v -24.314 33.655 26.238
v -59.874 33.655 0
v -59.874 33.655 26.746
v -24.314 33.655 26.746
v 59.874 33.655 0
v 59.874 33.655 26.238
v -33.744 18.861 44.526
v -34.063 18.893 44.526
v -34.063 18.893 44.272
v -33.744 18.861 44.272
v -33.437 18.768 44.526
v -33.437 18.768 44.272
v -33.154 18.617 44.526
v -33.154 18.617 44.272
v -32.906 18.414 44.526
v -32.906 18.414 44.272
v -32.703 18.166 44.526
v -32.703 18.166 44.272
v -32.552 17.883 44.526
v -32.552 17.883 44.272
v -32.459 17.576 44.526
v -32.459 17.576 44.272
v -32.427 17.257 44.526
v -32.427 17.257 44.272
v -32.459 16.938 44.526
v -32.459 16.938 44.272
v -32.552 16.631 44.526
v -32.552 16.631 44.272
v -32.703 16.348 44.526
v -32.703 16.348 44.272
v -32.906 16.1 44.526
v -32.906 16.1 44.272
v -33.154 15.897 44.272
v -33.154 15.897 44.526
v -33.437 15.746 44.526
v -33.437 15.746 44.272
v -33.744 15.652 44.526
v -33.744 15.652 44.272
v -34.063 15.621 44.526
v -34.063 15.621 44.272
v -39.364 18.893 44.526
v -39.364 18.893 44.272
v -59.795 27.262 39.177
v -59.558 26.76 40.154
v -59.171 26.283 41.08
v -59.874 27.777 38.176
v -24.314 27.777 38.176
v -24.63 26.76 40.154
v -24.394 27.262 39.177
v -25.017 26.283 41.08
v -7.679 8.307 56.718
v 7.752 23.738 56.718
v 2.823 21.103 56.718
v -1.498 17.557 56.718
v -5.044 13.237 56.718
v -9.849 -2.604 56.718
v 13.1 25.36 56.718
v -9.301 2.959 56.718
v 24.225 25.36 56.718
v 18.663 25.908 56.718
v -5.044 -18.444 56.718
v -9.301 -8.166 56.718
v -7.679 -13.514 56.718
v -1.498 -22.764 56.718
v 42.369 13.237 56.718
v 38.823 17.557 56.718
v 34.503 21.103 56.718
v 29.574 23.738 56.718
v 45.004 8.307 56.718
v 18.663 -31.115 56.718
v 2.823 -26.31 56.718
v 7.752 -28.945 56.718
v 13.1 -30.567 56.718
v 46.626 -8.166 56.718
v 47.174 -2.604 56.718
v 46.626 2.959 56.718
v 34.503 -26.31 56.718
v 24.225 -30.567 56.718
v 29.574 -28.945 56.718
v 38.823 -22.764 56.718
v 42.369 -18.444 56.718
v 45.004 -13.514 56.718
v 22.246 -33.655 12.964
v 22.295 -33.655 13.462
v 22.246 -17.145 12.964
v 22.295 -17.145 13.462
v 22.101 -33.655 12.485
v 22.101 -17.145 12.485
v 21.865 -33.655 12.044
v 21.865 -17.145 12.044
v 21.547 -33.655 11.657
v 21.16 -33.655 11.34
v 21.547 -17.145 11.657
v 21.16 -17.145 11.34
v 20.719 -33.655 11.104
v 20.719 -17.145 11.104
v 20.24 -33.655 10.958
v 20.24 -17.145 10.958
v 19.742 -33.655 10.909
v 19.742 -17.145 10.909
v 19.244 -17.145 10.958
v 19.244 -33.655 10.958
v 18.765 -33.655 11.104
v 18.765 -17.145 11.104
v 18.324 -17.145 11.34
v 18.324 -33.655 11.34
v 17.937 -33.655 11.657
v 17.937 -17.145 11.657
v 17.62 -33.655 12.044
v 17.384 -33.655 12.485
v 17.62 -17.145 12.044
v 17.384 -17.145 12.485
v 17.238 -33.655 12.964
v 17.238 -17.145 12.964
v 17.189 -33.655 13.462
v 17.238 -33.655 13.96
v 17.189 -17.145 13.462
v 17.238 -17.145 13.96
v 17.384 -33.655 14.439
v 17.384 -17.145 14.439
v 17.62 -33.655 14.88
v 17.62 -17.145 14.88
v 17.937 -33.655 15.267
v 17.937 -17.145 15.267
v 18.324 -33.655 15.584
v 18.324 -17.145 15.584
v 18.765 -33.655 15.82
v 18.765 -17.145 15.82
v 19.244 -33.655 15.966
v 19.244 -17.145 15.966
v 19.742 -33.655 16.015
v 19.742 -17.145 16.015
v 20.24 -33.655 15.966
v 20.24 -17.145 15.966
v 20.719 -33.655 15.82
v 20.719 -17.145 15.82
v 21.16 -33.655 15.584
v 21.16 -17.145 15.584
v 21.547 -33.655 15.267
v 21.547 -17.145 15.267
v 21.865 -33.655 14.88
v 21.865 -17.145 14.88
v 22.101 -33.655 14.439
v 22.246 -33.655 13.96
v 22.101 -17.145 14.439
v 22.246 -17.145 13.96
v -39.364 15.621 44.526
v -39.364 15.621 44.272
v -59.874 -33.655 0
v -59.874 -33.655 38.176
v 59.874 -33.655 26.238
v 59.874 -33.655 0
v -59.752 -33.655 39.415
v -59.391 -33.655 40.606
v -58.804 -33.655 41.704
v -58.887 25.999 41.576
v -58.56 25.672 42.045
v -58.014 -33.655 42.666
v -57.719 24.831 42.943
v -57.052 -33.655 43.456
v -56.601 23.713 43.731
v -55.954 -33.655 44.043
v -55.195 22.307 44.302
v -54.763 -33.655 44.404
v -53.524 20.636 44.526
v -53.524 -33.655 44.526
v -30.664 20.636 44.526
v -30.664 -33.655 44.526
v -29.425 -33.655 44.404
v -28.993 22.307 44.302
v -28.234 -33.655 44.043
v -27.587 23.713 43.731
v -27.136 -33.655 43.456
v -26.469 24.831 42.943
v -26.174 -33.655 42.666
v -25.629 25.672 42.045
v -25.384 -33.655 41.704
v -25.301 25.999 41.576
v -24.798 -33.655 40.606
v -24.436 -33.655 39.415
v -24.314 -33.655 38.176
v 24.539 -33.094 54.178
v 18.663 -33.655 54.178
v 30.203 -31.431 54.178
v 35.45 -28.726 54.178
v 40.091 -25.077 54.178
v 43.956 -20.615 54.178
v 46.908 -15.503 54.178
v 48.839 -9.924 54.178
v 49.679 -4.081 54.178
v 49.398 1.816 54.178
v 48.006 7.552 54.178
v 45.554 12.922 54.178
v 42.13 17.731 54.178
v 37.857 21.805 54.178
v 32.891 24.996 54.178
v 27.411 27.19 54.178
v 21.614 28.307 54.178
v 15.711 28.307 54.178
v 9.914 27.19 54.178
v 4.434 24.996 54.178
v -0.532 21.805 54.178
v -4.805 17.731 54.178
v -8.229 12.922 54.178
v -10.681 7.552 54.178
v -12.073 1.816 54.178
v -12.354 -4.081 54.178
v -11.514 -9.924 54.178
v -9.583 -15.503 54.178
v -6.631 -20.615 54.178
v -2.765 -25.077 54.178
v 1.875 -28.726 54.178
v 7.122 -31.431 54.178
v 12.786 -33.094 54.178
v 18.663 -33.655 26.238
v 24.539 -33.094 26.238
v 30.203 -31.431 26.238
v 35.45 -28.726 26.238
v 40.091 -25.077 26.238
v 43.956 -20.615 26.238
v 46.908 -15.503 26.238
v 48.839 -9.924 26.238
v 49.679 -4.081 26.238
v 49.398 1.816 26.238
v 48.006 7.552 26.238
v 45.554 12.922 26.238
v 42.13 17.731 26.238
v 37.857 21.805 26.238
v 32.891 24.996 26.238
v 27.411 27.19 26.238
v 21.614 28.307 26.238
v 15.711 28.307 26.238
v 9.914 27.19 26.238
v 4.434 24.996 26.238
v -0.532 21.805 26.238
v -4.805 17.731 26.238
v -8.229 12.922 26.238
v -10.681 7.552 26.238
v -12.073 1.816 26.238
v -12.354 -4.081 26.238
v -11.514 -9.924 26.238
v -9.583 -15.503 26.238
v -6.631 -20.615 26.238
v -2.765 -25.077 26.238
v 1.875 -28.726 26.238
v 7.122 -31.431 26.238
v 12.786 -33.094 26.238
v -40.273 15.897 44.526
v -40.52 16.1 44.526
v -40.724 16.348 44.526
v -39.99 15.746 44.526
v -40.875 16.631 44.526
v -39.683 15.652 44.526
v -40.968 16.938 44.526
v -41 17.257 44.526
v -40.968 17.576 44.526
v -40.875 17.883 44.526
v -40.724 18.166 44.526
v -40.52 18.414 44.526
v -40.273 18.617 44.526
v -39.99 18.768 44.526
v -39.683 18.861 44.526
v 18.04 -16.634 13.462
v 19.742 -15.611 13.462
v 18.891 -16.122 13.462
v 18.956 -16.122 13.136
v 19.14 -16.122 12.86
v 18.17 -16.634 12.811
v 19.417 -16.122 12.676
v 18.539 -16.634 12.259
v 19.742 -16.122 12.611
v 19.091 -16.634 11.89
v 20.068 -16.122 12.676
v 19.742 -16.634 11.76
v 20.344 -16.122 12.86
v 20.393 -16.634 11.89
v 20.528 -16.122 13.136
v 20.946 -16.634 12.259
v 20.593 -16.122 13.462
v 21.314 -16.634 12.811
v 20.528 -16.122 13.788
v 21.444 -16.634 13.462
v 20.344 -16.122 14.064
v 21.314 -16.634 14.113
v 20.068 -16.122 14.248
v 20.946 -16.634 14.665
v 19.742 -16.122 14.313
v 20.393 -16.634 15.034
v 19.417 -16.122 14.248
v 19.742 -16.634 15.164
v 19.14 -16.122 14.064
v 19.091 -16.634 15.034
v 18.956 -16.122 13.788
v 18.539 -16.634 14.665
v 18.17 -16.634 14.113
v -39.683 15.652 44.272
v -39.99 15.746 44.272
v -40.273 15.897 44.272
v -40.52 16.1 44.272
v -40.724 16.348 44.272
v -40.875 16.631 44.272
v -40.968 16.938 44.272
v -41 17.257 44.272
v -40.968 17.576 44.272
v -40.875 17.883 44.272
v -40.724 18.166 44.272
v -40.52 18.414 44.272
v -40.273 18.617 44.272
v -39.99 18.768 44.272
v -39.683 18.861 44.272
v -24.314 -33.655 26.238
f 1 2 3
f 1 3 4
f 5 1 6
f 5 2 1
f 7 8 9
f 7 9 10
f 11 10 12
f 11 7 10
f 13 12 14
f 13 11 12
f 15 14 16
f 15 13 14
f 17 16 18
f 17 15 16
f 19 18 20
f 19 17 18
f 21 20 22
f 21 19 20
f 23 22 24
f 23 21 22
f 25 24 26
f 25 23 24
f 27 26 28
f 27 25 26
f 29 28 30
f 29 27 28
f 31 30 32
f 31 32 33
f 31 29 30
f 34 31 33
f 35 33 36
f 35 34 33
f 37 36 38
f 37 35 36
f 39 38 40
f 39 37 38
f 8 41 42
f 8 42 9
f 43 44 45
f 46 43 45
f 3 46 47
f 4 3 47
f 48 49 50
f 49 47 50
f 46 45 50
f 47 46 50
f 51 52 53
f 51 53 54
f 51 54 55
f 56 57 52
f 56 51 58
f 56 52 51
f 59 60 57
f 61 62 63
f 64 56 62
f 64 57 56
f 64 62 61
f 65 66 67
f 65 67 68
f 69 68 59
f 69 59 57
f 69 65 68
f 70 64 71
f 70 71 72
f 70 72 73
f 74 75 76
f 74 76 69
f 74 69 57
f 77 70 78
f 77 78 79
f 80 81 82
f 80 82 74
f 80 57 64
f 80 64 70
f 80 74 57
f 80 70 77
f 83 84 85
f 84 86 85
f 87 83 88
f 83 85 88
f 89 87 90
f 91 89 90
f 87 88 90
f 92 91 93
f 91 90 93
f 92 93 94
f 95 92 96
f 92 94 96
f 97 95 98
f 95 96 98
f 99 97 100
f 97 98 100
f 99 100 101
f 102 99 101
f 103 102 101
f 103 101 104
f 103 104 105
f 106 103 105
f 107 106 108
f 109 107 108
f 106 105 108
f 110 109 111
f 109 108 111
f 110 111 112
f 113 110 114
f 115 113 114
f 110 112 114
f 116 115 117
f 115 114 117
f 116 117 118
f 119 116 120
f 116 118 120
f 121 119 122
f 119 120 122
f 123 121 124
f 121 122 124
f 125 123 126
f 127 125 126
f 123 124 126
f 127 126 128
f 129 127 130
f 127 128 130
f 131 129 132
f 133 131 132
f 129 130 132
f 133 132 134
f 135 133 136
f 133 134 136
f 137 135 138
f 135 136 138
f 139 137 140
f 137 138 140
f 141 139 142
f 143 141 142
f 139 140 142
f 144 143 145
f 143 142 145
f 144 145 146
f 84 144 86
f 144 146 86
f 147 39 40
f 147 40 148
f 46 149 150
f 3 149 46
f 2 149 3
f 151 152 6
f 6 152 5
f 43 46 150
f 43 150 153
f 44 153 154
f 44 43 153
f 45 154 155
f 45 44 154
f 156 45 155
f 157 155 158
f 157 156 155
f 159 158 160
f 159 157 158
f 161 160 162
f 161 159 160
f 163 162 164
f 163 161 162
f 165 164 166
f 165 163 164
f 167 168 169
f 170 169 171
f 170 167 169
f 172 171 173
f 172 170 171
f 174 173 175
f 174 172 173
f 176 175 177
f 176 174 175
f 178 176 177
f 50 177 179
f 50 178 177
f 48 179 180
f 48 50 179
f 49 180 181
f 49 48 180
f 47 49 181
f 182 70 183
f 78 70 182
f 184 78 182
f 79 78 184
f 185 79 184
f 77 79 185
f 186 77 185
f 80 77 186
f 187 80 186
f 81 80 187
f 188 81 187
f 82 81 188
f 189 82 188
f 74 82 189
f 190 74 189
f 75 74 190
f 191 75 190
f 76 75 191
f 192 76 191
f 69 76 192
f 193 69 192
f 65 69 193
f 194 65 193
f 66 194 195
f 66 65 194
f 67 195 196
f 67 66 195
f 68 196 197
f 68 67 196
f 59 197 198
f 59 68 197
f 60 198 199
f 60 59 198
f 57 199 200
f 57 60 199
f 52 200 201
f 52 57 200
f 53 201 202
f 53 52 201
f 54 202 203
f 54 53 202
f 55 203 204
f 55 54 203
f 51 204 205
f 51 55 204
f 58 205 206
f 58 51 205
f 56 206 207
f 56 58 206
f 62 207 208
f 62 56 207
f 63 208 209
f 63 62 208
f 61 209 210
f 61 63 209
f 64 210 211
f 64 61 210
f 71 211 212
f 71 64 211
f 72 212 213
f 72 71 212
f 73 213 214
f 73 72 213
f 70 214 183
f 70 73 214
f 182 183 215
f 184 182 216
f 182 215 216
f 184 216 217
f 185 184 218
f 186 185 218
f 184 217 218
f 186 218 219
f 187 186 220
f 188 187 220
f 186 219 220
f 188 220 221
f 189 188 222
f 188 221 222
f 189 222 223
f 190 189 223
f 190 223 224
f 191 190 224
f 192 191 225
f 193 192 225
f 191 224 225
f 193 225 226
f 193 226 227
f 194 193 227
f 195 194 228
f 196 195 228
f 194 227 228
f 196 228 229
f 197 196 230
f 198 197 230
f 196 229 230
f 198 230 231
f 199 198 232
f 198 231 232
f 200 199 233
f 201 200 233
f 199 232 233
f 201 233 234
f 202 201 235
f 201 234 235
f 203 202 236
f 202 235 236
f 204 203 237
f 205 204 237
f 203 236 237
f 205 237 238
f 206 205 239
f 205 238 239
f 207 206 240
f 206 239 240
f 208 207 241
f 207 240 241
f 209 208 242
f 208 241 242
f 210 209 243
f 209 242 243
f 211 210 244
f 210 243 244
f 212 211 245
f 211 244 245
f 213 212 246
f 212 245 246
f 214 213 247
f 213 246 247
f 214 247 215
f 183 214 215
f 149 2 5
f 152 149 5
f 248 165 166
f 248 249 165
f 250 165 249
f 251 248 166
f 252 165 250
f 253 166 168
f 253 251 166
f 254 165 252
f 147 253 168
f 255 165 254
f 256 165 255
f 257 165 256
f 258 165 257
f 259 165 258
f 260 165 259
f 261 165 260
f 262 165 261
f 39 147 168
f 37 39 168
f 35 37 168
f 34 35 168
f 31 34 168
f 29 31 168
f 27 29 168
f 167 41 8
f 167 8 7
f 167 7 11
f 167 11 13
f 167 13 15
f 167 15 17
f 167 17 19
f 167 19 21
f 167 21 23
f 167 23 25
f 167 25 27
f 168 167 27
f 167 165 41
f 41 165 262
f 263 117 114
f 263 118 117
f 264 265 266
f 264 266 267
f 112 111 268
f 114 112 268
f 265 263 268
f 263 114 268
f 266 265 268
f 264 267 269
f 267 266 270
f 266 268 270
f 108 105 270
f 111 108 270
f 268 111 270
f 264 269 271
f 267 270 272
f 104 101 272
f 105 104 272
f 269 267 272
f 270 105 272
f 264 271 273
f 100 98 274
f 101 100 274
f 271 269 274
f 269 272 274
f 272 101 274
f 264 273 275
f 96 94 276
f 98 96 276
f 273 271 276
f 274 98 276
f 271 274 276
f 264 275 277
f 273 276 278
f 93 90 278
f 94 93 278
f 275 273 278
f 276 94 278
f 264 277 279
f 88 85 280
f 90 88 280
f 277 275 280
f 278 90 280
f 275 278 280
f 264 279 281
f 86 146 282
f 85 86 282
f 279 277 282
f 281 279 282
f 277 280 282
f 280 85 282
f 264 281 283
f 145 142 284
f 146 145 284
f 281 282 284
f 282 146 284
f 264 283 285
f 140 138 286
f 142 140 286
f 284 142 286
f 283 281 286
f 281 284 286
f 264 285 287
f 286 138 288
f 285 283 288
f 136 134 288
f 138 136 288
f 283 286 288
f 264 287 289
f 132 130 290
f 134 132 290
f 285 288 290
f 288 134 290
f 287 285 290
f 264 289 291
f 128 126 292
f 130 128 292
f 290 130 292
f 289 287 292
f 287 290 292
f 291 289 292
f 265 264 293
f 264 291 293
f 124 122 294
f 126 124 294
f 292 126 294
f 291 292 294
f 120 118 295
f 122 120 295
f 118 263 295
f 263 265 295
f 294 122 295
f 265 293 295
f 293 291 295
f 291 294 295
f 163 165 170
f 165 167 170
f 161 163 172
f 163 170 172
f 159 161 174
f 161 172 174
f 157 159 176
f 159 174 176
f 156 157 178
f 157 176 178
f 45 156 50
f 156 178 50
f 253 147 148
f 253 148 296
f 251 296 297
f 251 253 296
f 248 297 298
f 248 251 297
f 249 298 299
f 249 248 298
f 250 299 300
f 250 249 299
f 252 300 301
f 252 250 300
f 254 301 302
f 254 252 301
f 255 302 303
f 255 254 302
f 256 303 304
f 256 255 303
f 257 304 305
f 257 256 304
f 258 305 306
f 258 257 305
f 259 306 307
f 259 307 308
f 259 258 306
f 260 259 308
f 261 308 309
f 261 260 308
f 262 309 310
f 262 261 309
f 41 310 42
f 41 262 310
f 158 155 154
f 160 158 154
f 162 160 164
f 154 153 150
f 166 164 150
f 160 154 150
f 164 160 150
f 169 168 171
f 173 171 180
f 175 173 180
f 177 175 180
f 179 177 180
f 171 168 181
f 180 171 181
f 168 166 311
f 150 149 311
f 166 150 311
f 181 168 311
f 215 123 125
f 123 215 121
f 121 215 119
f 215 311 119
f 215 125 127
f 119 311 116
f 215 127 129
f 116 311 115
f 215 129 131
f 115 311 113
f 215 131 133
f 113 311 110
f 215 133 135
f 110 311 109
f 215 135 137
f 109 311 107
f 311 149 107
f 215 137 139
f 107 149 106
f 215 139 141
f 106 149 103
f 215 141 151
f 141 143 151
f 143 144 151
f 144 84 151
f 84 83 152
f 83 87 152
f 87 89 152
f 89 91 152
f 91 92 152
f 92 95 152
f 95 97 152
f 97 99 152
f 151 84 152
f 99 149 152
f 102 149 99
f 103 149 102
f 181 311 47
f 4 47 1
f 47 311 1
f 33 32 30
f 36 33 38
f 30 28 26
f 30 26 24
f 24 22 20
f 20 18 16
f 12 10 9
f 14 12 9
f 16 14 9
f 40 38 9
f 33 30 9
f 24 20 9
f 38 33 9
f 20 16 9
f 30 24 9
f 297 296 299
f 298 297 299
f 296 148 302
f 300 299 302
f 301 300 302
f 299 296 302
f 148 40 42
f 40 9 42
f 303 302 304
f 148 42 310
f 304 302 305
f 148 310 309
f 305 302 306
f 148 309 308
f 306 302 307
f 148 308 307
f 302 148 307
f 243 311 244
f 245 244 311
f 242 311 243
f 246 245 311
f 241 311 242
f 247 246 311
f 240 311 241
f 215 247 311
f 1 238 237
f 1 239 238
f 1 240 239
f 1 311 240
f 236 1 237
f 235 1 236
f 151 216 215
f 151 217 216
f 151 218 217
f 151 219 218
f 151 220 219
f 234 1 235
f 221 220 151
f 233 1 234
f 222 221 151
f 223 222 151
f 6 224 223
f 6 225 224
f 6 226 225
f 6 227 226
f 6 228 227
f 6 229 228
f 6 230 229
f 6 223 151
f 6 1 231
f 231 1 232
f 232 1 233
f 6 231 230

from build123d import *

# Parameters (mm, degrees)
SKETCH1_W                   = 119.7483
SKETCH1_H                   = 67.31
BOSS_EXTRUDE1_DEPTH         = 26.2382
SKETCH2_R                   = 31.0515
BOSS_EXTRUDE2_DEPTH         = 30.48
CHAMFER1_SIZE               = 2.54
SKETCH3_W                   = 35.56
SKETCH3_H                   = 67.31
BOSS_EXTRUDE3_DEPTH         = 18.288
CHAMFER2_SIZE               = 17.78
CHAMFER2_SIZE2              = 9.144
FILLET1_R                   = 6.35
CUT_EXTRUDE1_DEPTH          = 0.254
F_1_4_20_TAPPED_HOLE1_D     = 5.1054
F_1_4_20_TAPPED_HOLE1_DEPTH = 16.51
F_1_4_20_TAPPED_HOLE1_TIP   = 1.533816902


with BuildPart() as part:
    # Sketch1 → Boss-Extrude1 (new body)
    with BuildSketch(Plane.XY):
        Rectangle(SKETCH1_W, SKETCH1_H)
    extrude(amount=BOSS_EXTRUDE1_DEPTH)

    # Sketch2 → Boss-Extrude2 (add)
    with BuildSketch(Plane.XY.offset(26.2382)):
        with Locations(Location((18.66265, -2.6035, 0), (0, 0, 270))):
            Circle(SKETCH2_R)
    extrude(amount=BOSS_EXTRUDE2_DEPTH)

    # Chamfer1
    chamfer1_edges = [part.edges().sort_by_distance(p)[0] for p in [
        (18.66265, 28.448, 56.7182),
    ]]
    chamfer(chamfer1_edges, length=CHAMFER1_SIZE)

    # Sketch3 → Boss-Extrude3 (add)
    with BuildSketch(Plane.XY.offset(26.2382)):
        with Locations((-42.09415, 0)):
            Rectangle(SKETCH3_W, SKETCH3_H)
    extrude(amount=BOSS_EXTRUDE3_DEPTH)

    # Chamfer2
    chamfer2_edges = [part.edges().sort_by_distance(p)[0] for p in [
        (-42.09415, 33.655, 44.5262),
    ]]
    chamfer2_side = [part.faces().sort_by_distance(p)[0] for p in [
        (-7.218498902, 33.655, 16.936879024),
    ]]
    chamfer(chamfer2_edges, length=CHAMFER2_SIZE, length2=CHAMFER2_SIZE2, reference=chamfer2_side[0])

    # Fillet1
    fillet1_edges = [part.edges().sort_by_distance(p)[0] for p in [
        (-24.31415, -4.572, 44.5262),
        (-59.87415, -4.572, 44.5262),
        (-42.09415, 24.511, 44.5262),
    ]]
    fillet(fillet1_edges, radius=FILLET1_R)

    # Sketch4 → Cut-Extrude1 (cut)
    with BuildSketch(Plane.XY.offset(44.5262)):
        with BuildLine():
            Line((-39.36365, 18.892871189), (-34.063036375, 18.892871189))
            ThreePointArc((-34.063036375, 18.892871189), (-32.427100781, 17.256935594), (-34.063036375, 15.621))
            Line((-34.063036375, 15.621), (-39.36365, 15.621))
            ThreePointArc((-39.36365, 15.621), (-40.999585594, 17.256935594), (-39.36365, 18.892871189))
        make_face()
    extrude(amount=-CUT_EXTRUDE1_DEPTH, mode=Mode.SUBTRACT)

    # 1/4-20 Tapped Hole1
    with Locations(Plane(origin=(0, -33.655, 0), x_dir=(-1, 0, 0), z_dir=(0, -1, 0))):
        with Locations((-19.74215, -13.462)):
            Hole(F_1_4_20_TAPPED_HOLE1_D / 2, depth=F_1_4_20_TAPPED_HOLE1_DEPTH)
            with Locations((0, 0, -(F_1_4_20_TAPPED_HOLE1_DEPTH + F_1_4_20_TAPPED_HOLE1_TIP / 2))):  # 118° drill point
                Cone(0, F_1_4_20_TAPPED_HOLE1_D / 2, F_1_4_20_TAPPED_HOLE1_TIP, mode=Mode.SUBTRACT)


solid = part.part
